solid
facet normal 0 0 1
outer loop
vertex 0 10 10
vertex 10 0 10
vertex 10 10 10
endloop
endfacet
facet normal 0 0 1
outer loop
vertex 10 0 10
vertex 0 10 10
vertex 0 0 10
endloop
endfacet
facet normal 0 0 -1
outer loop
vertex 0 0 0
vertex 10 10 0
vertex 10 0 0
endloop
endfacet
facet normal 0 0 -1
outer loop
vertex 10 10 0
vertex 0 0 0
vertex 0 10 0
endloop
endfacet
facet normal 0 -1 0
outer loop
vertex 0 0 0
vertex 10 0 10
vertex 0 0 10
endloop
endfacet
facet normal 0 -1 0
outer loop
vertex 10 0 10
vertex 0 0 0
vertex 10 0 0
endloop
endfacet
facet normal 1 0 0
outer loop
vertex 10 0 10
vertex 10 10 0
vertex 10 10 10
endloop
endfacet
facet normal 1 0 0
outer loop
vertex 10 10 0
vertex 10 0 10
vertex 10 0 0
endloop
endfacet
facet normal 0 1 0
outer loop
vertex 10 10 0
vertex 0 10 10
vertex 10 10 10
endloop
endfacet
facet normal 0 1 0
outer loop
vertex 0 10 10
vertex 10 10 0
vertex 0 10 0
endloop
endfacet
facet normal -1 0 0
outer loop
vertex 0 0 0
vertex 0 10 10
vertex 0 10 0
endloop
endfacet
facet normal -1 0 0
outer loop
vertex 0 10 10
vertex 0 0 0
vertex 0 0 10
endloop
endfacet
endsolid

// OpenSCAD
// TEST 12: echo() and assert() — must be silently skipped
// Expected: only the cube is visible; echo/assert lines are ignored.
// Check: no parse error, tree contains exactly one cube.

$fn = 16;

r = 10;

echo("Test 12: echo and assert skip");
echo("r =", r, "  height =", r * 2);

assert(r > 0, "radius must be positive");
assert(r < 100);

cube([r, r, r]);

echo("done");
